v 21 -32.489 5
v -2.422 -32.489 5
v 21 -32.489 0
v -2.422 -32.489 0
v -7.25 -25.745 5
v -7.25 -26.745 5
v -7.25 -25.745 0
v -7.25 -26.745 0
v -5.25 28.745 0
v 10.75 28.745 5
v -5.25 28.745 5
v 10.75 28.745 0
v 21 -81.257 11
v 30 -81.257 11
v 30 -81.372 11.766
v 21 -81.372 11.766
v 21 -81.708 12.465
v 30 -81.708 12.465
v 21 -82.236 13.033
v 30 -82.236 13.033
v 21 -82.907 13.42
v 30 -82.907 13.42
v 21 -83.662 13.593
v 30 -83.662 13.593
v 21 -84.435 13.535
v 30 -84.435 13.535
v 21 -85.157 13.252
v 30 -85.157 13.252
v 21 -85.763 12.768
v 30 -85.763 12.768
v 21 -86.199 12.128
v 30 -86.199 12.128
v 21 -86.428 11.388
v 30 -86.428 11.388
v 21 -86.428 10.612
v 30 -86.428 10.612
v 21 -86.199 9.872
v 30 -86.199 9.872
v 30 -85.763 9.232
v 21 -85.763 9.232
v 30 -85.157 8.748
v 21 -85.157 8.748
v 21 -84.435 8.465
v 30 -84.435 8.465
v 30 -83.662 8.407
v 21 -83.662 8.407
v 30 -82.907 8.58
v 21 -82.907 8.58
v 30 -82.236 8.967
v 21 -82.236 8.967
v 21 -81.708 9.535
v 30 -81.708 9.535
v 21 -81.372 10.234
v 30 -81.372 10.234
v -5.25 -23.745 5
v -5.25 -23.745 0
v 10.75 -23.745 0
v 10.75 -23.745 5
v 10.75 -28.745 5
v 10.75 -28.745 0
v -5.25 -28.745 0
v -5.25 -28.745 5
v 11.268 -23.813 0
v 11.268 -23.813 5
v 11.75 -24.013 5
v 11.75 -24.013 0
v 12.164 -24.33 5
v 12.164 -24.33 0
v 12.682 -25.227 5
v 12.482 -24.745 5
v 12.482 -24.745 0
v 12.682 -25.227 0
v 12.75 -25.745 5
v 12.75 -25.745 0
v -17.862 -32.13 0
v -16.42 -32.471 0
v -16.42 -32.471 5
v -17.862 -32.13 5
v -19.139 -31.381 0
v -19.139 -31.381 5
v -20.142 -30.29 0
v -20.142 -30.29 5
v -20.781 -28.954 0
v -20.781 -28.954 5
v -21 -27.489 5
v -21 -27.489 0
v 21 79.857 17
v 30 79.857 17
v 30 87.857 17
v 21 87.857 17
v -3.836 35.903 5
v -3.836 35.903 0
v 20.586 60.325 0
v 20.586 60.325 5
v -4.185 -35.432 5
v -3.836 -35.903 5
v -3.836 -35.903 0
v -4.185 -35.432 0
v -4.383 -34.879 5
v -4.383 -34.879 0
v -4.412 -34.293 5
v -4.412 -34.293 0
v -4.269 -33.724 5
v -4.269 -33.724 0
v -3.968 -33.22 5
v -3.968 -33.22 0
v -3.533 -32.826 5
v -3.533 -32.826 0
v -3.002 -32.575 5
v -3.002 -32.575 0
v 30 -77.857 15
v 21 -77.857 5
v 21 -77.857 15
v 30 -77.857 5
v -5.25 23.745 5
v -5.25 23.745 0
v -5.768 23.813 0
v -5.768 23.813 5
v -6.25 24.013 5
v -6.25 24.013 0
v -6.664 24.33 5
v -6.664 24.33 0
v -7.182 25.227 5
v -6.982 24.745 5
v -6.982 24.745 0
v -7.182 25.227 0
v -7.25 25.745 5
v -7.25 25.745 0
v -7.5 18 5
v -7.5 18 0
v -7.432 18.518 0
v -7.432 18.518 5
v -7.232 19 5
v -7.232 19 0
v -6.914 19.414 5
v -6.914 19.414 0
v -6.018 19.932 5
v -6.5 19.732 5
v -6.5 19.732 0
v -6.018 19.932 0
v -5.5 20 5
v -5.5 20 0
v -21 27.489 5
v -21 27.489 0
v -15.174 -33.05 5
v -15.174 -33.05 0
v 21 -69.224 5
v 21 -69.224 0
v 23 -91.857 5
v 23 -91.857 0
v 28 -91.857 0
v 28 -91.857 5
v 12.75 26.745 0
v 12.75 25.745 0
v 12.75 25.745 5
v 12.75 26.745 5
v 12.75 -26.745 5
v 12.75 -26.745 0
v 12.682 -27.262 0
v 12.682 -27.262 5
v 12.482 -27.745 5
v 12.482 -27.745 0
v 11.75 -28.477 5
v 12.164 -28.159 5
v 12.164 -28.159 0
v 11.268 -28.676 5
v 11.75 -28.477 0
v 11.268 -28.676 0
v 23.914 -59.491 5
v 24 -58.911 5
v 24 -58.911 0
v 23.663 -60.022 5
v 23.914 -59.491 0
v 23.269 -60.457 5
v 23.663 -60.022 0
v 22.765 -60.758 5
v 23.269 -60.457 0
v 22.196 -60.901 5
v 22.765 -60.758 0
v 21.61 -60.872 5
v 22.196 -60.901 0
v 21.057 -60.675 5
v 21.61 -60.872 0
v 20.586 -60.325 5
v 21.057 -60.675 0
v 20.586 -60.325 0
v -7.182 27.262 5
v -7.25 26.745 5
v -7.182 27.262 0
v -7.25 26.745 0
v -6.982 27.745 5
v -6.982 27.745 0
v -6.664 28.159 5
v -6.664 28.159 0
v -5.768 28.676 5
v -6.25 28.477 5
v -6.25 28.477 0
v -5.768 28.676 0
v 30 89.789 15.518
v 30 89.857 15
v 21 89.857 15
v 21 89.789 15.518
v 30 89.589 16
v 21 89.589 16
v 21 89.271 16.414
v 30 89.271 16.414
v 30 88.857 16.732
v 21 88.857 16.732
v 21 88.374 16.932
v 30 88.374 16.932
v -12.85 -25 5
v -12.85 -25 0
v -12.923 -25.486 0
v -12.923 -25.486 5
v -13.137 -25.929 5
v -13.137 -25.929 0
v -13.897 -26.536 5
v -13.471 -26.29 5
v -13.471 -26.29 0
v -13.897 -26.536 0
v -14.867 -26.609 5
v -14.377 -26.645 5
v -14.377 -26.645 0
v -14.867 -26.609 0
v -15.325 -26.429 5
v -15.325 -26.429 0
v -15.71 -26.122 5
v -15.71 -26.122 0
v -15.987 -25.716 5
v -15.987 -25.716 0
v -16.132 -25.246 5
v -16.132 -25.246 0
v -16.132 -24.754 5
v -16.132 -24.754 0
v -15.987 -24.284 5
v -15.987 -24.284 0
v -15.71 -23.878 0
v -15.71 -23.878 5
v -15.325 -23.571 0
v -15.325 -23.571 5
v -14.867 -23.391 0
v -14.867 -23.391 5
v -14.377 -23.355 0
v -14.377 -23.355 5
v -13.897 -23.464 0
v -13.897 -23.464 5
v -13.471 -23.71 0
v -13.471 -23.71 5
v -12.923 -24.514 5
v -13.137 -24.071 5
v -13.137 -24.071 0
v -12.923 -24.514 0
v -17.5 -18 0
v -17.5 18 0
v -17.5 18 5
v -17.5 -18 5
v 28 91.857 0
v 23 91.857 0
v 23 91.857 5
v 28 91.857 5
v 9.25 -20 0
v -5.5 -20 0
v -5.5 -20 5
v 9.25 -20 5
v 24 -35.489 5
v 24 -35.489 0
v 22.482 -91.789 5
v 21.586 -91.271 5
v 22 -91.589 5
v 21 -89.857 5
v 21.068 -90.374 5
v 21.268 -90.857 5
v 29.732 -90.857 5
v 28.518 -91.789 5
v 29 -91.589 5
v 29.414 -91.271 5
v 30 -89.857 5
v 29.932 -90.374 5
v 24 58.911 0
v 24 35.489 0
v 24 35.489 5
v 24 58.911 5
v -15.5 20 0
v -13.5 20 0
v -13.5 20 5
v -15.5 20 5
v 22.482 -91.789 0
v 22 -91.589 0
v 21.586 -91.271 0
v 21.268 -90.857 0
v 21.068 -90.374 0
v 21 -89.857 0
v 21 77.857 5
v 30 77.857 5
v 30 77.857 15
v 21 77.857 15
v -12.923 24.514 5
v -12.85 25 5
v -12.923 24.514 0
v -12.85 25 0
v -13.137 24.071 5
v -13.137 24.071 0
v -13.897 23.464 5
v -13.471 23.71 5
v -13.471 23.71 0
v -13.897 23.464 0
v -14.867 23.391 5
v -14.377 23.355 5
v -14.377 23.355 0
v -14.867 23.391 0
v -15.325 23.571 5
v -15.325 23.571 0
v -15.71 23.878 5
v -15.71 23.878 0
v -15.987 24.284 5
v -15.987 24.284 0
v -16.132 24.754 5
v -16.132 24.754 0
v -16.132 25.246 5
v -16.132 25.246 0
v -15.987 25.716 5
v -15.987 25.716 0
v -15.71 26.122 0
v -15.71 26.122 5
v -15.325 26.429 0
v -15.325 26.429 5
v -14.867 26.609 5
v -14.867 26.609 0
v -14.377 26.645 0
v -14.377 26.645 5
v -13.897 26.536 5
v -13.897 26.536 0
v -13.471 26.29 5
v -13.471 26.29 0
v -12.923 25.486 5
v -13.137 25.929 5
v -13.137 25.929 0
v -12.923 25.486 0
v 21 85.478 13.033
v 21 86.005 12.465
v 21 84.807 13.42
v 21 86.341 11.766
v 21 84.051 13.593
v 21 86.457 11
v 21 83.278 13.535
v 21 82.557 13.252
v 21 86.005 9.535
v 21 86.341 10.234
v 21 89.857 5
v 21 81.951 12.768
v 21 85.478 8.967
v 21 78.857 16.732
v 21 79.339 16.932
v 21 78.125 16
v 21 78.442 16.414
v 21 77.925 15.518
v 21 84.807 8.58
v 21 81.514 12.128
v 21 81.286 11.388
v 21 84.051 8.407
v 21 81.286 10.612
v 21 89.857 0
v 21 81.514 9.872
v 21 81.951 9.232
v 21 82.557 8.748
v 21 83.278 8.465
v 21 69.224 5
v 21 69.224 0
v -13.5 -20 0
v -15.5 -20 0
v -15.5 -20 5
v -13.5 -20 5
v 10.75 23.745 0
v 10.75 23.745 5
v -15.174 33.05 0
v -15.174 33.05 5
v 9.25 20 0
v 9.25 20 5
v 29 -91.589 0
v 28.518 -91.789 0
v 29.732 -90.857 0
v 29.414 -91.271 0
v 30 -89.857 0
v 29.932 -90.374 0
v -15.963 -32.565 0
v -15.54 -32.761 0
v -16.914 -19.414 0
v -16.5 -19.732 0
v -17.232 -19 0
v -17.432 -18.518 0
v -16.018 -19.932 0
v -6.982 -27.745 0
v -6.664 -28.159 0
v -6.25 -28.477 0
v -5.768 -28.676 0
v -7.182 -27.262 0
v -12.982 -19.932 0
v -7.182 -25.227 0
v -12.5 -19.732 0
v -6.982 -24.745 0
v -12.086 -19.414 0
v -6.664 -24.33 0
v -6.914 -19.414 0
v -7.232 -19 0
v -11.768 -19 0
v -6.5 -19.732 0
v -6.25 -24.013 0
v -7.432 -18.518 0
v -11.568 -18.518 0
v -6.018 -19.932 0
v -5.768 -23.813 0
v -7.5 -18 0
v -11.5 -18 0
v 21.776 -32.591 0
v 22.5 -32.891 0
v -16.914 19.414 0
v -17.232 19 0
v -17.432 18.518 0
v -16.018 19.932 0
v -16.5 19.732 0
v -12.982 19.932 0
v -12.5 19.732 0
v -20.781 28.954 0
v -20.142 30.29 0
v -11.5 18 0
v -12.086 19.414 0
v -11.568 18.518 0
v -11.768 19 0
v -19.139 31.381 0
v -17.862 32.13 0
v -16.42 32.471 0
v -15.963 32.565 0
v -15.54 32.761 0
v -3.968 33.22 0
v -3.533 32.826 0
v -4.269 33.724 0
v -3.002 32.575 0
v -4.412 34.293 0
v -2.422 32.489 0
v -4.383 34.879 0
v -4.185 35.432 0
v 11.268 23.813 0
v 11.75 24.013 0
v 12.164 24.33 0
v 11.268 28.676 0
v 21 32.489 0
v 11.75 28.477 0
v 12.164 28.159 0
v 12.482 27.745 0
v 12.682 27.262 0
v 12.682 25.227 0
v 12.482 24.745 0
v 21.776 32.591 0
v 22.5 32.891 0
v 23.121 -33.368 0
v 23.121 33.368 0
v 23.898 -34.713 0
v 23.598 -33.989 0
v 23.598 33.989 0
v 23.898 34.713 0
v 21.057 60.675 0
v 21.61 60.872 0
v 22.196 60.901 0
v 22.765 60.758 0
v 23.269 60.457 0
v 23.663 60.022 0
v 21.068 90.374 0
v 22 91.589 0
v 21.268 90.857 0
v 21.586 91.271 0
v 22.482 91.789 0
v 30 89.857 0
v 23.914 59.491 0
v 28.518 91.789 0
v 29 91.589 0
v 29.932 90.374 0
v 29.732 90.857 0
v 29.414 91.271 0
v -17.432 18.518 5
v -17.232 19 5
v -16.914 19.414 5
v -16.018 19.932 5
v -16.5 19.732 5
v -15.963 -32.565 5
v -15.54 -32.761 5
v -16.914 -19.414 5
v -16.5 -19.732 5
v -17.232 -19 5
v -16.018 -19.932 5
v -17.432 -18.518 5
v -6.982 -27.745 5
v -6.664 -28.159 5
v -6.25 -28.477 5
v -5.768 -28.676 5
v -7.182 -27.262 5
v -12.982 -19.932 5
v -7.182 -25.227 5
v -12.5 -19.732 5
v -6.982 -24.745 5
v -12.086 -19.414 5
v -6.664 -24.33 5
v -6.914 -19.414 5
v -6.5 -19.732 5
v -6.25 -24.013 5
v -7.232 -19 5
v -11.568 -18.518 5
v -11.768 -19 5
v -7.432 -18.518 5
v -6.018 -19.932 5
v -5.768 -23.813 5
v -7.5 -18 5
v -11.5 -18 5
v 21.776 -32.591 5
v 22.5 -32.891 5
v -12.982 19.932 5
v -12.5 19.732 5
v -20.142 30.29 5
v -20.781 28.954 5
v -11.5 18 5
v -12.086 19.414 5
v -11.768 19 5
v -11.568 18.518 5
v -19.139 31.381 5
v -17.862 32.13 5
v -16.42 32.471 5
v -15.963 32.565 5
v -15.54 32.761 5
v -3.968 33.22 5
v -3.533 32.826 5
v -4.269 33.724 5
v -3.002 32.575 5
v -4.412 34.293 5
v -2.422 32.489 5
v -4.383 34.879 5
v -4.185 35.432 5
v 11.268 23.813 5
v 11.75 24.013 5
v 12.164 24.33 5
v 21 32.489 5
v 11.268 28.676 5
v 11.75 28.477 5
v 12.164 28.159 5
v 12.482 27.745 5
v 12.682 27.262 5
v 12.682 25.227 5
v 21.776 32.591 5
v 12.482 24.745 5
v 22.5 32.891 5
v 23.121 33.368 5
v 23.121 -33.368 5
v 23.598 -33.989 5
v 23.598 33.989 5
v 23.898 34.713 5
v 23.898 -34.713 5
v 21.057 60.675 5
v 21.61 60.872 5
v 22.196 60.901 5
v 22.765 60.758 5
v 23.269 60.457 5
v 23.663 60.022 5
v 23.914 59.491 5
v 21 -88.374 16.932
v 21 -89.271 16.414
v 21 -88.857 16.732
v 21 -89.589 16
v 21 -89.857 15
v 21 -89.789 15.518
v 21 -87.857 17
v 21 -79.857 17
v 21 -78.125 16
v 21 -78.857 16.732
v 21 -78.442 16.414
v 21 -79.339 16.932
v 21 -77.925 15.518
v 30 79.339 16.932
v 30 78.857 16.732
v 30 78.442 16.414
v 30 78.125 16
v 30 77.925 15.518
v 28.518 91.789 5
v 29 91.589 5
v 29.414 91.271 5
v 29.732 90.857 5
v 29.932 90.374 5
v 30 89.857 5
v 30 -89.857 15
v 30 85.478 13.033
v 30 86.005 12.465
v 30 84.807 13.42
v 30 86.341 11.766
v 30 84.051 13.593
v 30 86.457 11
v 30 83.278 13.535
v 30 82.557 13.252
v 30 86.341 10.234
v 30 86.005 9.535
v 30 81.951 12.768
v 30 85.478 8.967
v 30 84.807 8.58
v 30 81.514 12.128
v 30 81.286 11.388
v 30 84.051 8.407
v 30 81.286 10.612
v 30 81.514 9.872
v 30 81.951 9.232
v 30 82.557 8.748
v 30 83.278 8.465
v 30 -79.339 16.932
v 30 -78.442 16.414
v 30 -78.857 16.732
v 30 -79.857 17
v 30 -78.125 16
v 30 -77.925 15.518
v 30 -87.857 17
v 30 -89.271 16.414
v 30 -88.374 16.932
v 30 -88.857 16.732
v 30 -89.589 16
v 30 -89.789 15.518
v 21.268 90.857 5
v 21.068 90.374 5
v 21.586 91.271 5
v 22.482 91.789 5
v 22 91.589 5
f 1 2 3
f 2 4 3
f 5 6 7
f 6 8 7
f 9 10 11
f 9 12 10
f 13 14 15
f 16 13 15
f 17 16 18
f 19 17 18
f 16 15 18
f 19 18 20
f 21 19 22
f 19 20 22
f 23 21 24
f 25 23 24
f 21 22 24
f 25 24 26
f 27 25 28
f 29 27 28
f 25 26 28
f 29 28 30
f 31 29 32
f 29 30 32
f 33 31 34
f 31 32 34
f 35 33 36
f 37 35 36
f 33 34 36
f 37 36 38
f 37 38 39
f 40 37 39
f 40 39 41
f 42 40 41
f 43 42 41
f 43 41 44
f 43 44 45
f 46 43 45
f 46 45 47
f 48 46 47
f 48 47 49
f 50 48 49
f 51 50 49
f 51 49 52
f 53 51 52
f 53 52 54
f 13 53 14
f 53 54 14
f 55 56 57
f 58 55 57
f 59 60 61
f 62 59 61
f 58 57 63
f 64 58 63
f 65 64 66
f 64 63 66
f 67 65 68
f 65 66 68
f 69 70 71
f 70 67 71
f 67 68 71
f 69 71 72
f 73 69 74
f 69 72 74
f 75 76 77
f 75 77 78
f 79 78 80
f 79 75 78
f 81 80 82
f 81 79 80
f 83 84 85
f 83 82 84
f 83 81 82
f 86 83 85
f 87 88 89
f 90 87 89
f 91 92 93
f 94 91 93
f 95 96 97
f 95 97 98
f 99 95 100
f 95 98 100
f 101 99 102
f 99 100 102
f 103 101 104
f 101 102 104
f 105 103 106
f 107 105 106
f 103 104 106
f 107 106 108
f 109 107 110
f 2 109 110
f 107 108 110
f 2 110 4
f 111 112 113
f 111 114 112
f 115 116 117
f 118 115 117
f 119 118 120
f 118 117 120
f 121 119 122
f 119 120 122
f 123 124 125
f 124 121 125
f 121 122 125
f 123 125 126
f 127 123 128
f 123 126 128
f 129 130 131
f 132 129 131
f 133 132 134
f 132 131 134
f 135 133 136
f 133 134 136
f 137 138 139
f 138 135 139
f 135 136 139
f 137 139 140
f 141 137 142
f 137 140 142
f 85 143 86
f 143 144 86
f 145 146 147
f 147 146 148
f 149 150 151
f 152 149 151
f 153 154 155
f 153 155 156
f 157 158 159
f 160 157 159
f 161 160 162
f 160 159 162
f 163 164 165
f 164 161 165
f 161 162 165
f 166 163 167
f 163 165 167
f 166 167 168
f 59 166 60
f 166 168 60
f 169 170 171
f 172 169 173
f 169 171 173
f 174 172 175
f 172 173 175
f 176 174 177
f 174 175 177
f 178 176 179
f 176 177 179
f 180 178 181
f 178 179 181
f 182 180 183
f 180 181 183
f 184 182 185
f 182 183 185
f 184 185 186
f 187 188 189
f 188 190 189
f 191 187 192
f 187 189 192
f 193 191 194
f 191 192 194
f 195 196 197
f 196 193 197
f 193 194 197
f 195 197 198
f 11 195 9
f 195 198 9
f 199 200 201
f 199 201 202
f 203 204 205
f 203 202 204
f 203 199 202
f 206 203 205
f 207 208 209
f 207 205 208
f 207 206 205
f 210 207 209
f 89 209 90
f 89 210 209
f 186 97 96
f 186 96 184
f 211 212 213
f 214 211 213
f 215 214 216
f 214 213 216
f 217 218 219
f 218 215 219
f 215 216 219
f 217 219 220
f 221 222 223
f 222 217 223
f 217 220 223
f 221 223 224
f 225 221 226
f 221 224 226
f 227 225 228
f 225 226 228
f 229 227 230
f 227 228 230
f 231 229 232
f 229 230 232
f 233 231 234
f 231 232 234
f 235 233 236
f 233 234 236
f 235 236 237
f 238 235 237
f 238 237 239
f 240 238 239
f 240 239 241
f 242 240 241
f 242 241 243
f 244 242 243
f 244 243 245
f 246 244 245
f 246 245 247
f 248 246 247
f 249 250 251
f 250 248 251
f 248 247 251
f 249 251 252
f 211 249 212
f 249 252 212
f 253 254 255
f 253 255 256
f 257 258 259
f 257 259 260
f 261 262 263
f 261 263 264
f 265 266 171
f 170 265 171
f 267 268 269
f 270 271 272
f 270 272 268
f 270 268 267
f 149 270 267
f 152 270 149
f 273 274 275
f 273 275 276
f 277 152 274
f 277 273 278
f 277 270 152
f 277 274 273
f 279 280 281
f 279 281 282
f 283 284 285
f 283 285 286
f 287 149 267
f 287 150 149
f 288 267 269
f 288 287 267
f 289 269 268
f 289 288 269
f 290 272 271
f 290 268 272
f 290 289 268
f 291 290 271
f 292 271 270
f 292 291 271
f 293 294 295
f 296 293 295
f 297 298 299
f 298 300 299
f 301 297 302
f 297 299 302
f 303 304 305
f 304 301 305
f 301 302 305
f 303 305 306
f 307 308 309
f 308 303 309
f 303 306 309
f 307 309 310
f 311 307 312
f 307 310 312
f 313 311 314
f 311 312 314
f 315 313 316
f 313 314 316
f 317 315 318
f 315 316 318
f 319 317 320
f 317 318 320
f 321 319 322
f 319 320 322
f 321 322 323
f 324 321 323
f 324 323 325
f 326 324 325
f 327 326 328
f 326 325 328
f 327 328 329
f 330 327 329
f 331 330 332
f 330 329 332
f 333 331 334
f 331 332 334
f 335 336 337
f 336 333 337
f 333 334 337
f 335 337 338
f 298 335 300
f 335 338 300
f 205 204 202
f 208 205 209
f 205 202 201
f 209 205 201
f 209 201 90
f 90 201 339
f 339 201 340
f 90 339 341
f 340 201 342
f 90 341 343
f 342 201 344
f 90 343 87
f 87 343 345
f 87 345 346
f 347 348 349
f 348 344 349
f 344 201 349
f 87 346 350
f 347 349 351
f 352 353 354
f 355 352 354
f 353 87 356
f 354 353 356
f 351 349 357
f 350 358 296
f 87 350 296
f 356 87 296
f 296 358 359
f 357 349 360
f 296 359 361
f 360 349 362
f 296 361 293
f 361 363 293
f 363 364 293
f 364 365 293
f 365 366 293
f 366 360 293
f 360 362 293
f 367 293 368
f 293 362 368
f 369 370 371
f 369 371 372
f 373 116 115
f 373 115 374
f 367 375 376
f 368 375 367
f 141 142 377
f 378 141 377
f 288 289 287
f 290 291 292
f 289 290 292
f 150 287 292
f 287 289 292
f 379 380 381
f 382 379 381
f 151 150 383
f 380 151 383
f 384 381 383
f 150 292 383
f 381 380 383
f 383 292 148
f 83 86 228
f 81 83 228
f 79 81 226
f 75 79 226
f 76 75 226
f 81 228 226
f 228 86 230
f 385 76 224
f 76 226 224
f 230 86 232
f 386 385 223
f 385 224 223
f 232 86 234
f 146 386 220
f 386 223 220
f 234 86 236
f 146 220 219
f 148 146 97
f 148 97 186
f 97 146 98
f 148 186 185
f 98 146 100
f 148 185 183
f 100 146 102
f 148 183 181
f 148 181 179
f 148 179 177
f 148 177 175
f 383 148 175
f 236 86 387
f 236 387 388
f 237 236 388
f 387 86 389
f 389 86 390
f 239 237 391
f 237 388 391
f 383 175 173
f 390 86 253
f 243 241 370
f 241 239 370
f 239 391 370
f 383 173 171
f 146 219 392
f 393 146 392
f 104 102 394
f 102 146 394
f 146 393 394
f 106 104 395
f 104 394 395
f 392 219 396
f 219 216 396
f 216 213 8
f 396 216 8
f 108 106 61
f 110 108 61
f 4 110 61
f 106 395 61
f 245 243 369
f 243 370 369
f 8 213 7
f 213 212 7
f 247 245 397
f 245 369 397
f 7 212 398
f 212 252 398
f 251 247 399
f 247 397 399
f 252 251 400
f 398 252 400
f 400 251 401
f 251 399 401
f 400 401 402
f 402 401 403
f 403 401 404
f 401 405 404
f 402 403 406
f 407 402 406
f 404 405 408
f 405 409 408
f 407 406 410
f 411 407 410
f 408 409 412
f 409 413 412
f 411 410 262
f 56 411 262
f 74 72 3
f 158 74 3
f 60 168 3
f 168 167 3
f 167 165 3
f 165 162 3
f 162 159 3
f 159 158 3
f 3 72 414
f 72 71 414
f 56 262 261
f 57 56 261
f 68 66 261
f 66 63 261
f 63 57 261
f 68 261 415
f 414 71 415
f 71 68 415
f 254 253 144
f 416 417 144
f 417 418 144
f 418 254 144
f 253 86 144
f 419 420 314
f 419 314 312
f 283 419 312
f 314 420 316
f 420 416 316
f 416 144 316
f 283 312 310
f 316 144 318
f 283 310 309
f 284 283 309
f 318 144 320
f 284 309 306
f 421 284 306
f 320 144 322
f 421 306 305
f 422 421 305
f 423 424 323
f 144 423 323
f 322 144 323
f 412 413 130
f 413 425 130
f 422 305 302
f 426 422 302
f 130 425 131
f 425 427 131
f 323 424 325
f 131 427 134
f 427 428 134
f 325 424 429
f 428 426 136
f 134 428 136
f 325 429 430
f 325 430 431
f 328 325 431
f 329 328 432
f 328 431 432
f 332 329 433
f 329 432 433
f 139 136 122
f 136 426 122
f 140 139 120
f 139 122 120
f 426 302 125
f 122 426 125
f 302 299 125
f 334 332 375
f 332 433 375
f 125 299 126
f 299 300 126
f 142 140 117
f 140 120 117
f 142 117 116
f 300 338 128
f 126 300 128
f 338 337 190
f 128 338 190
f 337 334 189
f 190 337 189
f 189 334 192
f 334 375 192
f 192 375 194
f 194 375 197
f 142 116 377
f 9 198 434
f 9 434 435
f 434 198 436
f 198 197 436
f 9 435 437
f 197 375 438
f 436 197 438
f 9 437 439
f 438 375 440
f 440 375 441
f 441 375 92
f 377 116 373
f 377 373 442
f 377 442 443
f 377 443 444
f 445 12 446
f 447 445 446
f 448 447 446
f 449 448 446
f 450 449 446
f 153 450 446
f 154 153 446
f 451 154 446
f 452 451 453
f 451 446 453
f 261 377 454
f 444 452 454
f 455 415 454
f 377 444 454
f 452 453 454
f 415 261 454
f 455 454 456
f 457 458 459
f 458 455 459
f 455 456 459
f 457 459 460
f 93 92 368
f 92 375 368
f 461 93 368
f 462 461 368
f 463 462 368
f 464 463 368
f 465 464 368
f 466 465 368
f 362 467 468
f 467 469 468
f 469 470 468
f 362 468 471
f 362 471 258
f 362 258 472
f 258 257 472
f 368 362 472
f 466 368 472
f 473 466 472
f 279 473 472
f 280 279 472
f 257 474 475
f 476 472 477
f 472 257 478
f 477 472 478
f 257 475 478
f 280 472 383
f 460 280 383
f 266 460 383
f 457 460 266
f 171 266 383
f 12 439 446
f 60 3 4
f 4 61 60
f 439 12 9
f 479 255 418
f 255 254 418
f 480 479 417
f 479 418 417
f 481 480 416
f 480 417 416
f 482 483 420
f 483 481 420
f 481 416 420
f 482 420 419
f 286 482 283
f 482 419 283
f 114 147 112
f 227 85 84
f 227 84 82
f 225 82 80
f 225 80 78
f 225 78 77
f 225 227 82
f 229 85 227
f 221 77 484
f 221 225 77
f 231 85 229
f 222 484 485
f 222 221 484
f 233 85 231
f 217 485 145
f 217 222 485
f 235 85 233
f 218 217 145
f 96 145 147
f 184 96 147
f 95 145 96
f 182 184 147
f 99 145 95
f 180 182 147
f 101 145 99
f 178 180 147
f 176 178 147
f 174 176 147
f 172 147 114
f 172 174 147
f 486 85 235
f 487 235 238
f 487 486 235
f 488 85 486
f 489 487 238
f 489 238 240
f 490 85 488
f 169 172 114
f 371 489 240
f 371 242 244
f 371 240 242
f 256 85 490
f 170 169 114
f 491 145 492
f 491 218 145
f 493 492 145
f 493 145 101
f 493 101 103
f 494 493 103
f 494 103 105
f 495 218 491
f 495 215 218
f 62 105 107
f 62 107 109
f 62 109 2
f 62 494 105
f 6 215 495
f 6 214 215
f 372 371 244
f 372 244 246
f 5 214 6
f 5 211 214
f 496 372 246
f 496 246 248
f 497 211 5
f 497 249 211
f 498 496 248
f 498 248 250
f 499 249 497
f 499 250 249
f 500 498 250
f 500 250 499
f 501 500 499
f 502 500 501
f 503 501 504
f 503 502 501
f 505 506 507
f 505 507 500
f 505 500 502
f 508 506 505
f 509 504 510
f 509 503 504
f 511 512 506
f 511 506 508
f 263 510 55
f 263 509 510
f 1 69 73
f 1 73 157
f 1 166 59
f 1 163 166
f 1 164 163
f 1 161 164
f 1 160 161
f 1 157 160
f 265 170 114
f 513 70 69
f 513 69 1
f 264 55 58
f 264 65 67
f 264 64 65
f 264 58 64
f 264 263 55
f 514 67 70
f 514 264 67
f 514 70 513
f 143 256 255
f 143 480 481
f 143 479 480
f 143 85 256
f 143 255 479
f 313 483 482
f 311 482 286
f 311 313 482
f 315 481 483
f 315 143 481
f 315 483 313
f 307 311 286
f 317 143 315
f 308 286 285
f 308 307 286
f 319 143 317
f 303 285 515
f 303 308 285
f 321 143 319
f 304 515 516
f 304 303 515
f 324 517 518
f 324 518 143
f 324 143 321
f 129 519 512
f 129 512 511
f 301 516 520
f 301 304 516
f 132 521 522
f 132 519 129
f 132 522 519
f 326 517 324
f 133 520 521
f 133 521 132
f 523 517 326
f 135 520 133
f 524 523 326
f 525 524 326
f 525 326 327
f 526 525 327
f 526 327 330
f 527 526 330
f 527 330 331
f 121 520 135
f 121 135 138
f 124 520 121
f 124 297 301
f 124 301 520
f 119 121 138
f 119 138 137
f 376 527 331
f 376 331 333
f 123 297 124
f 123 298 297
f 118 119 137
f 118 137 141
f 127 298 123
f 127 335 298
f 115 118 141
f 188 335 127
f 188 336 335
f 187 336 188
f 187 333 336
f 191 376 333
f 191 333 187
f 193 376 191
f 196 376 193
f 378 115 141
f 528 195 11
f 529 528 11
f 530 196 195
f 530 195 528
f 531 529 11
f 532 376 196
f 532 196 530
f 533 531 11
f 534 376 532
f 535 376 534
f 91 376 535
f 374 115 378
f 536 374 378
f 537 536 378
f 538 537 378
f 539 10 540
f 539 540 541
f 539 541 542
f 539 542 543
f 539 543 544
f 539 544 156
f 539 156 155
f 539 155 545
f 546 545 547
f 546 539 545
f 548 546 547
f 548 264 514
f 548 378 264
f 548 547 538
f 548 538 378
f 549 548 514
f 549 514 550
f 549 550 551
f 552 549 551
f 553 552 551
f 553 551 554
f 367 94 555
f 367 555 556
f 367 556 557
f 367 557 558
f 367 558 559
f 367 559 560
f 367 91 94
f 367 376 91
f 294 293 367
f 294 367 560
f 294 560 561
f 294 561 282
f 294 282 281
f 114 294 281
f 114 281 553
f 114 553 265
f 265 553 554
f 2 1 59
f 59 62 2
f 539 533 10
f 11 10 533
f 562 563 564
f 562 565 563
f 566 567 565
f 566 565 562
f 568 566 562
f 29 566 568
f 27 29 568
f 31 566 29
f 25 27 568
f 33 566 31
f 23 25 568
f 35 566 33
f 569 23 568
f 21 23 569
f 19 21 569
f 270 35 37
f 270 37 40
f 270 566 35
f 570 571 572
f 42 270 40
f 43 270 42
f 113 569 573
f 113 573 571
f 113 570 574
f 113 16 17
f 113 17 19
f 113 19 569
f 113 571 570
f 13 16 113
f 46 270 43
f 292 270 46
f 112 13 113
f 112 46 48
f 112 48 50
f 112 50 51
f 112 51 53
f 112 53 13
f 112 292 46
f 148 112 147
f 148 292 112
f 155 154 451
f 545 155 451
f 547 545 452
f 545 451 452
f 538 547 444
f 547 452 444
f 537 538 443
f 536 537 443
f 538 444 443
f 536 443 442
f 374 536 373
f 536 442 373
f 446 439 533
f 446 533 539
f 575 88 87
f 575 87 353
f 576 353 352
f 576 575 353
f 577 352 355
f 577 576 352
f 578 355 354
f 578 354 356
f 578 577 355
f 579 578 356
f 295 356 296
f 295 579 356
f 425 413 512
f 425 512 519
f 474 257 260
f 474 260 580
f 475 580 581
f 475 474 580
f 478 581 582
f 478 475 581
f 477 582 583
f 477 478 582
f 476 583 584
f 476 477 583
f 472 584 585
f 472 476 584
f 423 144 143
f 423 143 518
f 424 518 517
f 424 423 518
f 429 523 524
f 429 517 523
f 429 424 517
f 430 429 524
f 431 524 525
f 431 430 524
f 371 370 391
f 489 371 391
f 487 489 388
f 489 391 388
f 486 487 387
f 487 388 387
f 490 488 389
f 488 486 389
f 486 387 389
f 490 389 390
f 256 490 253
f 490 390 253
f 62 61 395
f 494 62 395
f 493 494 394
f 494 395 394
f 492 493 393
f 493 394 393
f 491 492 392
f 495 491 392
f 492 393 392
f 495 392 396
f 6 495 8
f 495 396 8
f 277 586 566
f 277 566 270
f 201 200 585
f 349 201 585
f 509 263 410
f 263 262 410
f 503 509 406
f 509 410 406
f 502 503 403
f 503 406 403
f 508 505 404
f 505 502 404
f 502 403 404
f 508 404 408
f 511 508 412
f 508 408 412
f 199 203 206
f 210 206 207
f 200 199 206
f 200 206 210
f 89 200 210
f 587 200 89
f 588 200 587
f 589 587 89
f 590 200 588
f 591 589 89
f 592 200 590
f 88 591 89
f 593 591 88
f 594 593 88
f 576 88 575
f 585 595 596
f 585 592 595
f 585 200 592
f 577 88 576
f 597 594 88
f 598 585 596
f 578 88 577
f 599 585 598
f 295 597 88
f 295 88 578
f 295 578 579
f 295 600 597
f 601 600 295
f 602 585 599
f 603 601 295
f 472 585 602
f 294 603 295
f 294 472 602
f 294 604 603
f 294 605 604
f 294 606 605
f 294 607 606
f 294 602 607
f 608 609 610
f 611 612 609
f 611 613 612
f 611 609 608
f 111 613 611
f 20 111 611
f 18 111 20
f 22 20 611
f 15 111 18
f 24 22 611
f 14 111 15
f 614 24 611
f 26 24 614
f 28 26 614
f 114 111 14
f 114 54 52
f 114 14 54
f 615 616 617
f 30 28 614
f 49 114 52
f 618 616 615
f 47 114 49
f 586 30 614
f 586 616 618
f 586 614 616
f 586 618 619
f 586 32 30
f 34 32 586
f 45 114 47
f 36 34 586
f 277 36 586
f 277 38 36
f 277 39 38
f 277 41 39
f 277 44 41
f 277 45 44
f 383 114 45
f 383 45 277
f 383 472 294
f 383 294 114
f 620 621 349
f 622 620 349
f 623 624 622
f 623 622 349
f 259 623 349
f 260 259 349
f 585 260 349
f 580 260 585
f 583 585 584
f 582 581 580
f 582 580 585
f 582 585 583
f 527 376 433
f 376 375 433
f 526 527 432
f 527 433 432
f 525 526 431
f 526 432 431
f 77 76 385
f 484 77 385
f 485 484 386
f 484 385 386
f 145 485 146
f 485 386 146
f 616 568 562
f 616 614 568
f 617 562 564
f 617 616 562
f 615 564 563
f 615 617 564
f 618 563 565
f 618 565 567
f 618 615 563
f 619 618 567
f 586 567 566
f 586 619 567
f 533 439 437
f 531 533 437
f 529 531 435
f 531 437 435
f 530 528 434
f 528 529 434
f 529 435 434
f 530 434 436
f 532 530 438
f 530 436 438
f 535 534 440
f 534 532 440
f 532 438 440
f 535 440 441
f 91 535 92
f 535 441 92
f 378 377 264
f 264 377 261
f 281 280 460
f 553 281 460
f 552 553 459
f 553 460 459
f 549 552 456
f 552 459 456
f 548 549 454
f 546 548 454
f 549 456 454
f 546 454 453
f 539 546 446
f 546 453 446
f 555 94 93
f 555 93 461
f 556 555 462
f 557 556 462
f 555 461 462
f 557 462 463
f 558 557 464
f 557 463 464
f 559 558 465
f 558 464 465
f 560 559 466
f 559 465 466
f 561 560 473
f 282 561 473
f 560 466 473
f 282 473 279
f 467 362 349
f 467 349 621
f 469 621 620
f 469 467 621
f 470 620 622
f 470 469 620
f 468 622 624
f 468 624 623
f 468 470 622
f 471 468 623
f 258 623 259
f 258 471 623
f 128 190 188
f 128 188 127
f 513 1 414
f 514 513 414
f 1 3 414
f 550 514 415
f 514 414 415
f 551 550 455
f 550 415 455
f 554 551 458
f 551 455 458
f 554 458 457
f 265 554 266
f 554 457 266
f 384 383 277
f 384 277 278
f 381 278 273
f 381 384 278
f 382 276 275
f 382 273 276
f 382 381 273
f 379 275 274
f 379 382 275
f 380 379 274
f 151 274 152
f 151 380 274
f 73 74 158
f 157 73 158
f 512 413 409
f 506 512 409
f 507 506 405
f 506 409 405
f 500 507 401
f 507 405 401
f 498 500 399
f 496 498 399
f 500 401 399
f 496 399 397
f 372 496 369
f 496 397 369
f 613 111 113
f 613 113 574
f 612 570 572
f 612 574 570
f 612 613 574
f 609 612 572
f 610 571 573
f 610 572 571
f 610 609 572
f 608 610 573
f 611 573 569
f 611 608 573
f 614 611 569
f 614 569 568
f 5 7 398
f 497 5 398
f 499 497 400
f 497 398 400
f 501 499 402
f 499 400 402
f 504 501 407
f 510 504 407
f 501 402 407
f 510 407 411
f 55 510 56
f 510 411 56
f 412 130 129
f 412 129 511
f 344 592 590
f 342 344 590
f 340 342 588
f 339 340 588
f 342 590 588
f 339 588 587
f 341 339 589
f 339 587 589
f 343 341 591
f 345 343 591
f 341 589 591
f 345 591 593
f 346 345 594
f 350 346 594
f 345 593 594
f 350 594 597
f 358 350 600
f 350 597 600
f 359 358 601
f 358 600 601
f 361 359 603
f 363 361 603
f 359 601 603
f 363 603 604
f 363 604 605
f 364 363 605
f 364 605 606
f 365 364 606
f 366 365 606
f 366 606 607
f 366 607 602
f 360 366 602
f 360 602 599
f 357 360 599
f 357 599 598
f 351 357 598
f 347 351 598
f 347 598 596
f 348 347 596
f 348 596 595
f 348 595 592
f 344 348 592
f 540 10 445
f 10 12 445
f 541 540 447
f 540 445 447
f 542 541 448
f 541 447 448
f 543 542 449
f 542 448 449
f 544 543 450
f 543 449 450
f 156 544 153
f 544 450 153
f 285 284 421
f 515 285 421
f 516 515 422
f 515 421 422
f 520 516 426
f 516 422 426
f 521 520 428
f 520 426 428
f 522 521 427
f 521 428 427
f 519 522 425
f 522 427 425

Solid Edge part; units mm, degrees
sketch "Sketch1" plane through (0, 0, 0) normal (0, 0, 1) x (1, 0, 0)
  arc A0 (-21, -27.4891) -> (-16.4203, -32.4714) centre (-16, -27.4891) ccw
  arc A1 (-15.1743, -33.0501) -> (-16.4203, -32.4714) centre (-16.5885, -34.4643) ccw
  line L0 (-15.1743, -33.0501) -> (21, -69.2244)
  line L1 (21, -89.8567) -> (21, -69.2244)
  arc A2 (21, -89.8567) -> (23, -91.8567) centre (23, -89.8567) ccw
  line L2 (23, -91.8567) -> (28, -91.8567)
  arc A3 (28, -91.8567) -> (30, -89.8567) centre (28, -89.8567) ccw
  line L3 (30, 89.8567) -> (30, -89.8567)
  arc A4 (28, 91.8567) -> (30, 89.8567) centre (28, 89.8567) cw
  line L4 (23, 91.8567) -> (28, 91.8567)
  arc A5 (21, 89.8567) -> (23, 91.8567) centre (23, 89.8567) cw
  line L5 (21, 89.8567) -> (21, 69.2244)
  line L6 (-15.1743, 33.0501) -> (21, 69.2244)
  arc A6 (-16.4203, 32.4714) -> (-15.1743, 33.0501) centre (-16.5885, 34.4643) ccw
  arc A7 (-16.4203, 32.4714) -> (-21, 27.4891) centre (-16, 27.4891) ccw
  line L7 (-21, 27.4891) -> (-21, -27.4891)
  circle A8 centre (-14.5, 25) radius 1.65
  circle A9 centre (-14.5, -25) radius 1.65
  arc A10 (-11.5, -18) -> (-13.5, -20) centre (-13.5, -18) cw
  line L8 (-15.5, -20) -> (-13.5, -20)
  arc A11 (-17.5, -18) -> (-15.5, -20) centre (-15.5, -18) ccw
  line L9 (-17.5, 18) -> (-17.5, -18)
  arc A12 (-15.5, 20) -> (-17.5, 18) centre (-15.5, 18) ccw
  line L10 (-13.5, 20) -> (-15.5, 20)
  arc A13 (-13.5, 20) -> (-11.5, 18) centre (-13.5, 18) cw
  line L11 (-11.5, -18) -> (-11.5, 18)
  line L12 (-5.25, -23.7446) -> (10.75, -23.7446)
  arc A14 (12.75, -25.7446) -> (10.75, -23.7446) centre (10.75, -25.7446) ccw
  line L13 (12.75, -25.7446) -> (12.75, -26.7446)
  arc A15 (10.75, -28.7446) -> (12.75, -26.7446) centre (10.75, -26.7446) ccw
  line L14 (10.75, -28.7446) -> (-5.25, -28.7446)
  arc A16 (-5.25, -28.7446) -> (-7.25, -26.7446) centre (-5.25, -26.7446) cw
  line L15 (-7.25, -26.7446) -> (-7.25, -25.7446)
  arc A17 (-7.25, -25.7446) -> (-5.25, -23.7446) centre (-5.25, -25.7446) cw
  line L16 (-5.5, -20) -> (9.25, -20)
  line L17 (9.25, 20) -> (9.25, -20)
  line L18 (-5.5, 20) -> (9.25, 20)
  arc A18 (-5.5, 20) -> (-7.5, 18) centre (-5.5, 18) ccw
  line L19 (-7.5, 18) -> (-7.5, -18)
  arc A19 (-7.5, -18) -> (-5.5, -20) centre (-5.5, -18) ccw
  line L20 (-5.25, 23.7446) -> (10.75, 23.7446)
  arc A20 (12.75, 25.7446) -> (10.75, 23.7446) centre (10.75, 25.7446) cw
  line L21 (12.75, 25.7446) -> (12.75, 26.7446)
  arc A21 (10.75, 28.7446) -> (12.75, 26.7446) centre (10.75, 26.7446) cw
  line L22 (10.75, 28.7446) -> (-5.25, 28.7446)
  arc A22 (-5.25, 28.7446) -> (-7.25, 26.7446) centre (-5.25, 26.7446) ccw
  line L23 (-7.25, 26.7446) -> (-7.25, 25.7446)
  arc A23 (-7.25, 25.7446) -> (-5.25, 23.7446) centre (-5.25, 25.7446) ccw
  arc A24 (24, 35.4891) -> (21, 32.4891) centre (21, 35.4891) cw
  line L24 (-2.4216, 32.4891) -> (21, 32.4891)
  arc A25 (-3.8358, 35.9033) -> (-2.4216, 32.4891) centre (-2.4216, 34.4891) ccw
  line L25 (-3.8358, 35.9033) -> (20.5858, 60.3249)
  arc A26 (20.5858, 60.3249) -> (24, 58.9107) centre (22, 58.9107) cw
  line L26 (24, 35.4891) -> (24, 58.9107)
extrude "Protrusion1" add sketch "Sketch1" along normal blind 5
sketch "Sketch2" plane through (0, 0, 0) normal (0, 0, 1) x (1, 0, 0)
  line L0 (-2.4216, -32.4891) -> (21, -32.4891)
  arc A0 (24, -35.4891) -> (21, -32.4891) centre (21, -35.4891) ccw
  line L1 (24, -35.4891) -> (24, -58.9107)
  arc A1 (20.5858, -60.3249) -> (24, -58.9107) centre (22, -58.9107) ccw
  line L2 (-3.8358, -35.9033) -> (20.5858, -60.3249)
  arc A2 (-3.8358, -35.9033) -> (-2.4216, -32.4891) centre (-2.4216, -34.4891) cw
extrude "ExtrudedCutout_3" cut sketch "Sketch2" along normal blind 9
sketch "Sketch3" plane through (30, 0, 2.5) normal (1, 0, 0) x (0, 1, 0)
  line L0 (-89.8567, 2.5) -> (-77.8567, 2.5)
  line L1 (-77.8567, 2.5) -> (-77.8567, 12.5)
  arc A0 (-79.8567, 14.5) -> (-77.8567, 12.5) centre (-79.8567, 12.5) cw
  line L2 (-79.8567, 14.5) -> (-87.8567, 14.5)
  arc A1 (-87.8567, 14.5) -> (-89.8567, 12.5) centre (-87.8567, 12.5) ccw
  line L3 (-89.8567, 12.5) -> (-89.8567, 2.5)
  circle A2 centre (-83.8567, 8.5) radius 2.6
  line L4 (89.8567, 2.5) -> (77.8567, 2.5)
  line L5 (77.8567, 2.5) -> (77.8567, 12.5)
  arc A3 (79.8567, 14.5) -> (77.8567, 12.5) centre (79.8567, 12.5) ccw
  line L6 (79.8567, 14.5) -> (87.8567, 14.5)
  arc A4 (87.8567, 14.5) -> (89.8567, 12.5) centre (87.8567, 12.5) cw
  line L7 (89.8567, 12.5) -> (89.8567, 2.5)
  circle A5 centre (83.8567, 8.5) radius 2.6
extrude "ExtrudedProtrusion_8" add sketch "Sketch3" against normal blind 9
